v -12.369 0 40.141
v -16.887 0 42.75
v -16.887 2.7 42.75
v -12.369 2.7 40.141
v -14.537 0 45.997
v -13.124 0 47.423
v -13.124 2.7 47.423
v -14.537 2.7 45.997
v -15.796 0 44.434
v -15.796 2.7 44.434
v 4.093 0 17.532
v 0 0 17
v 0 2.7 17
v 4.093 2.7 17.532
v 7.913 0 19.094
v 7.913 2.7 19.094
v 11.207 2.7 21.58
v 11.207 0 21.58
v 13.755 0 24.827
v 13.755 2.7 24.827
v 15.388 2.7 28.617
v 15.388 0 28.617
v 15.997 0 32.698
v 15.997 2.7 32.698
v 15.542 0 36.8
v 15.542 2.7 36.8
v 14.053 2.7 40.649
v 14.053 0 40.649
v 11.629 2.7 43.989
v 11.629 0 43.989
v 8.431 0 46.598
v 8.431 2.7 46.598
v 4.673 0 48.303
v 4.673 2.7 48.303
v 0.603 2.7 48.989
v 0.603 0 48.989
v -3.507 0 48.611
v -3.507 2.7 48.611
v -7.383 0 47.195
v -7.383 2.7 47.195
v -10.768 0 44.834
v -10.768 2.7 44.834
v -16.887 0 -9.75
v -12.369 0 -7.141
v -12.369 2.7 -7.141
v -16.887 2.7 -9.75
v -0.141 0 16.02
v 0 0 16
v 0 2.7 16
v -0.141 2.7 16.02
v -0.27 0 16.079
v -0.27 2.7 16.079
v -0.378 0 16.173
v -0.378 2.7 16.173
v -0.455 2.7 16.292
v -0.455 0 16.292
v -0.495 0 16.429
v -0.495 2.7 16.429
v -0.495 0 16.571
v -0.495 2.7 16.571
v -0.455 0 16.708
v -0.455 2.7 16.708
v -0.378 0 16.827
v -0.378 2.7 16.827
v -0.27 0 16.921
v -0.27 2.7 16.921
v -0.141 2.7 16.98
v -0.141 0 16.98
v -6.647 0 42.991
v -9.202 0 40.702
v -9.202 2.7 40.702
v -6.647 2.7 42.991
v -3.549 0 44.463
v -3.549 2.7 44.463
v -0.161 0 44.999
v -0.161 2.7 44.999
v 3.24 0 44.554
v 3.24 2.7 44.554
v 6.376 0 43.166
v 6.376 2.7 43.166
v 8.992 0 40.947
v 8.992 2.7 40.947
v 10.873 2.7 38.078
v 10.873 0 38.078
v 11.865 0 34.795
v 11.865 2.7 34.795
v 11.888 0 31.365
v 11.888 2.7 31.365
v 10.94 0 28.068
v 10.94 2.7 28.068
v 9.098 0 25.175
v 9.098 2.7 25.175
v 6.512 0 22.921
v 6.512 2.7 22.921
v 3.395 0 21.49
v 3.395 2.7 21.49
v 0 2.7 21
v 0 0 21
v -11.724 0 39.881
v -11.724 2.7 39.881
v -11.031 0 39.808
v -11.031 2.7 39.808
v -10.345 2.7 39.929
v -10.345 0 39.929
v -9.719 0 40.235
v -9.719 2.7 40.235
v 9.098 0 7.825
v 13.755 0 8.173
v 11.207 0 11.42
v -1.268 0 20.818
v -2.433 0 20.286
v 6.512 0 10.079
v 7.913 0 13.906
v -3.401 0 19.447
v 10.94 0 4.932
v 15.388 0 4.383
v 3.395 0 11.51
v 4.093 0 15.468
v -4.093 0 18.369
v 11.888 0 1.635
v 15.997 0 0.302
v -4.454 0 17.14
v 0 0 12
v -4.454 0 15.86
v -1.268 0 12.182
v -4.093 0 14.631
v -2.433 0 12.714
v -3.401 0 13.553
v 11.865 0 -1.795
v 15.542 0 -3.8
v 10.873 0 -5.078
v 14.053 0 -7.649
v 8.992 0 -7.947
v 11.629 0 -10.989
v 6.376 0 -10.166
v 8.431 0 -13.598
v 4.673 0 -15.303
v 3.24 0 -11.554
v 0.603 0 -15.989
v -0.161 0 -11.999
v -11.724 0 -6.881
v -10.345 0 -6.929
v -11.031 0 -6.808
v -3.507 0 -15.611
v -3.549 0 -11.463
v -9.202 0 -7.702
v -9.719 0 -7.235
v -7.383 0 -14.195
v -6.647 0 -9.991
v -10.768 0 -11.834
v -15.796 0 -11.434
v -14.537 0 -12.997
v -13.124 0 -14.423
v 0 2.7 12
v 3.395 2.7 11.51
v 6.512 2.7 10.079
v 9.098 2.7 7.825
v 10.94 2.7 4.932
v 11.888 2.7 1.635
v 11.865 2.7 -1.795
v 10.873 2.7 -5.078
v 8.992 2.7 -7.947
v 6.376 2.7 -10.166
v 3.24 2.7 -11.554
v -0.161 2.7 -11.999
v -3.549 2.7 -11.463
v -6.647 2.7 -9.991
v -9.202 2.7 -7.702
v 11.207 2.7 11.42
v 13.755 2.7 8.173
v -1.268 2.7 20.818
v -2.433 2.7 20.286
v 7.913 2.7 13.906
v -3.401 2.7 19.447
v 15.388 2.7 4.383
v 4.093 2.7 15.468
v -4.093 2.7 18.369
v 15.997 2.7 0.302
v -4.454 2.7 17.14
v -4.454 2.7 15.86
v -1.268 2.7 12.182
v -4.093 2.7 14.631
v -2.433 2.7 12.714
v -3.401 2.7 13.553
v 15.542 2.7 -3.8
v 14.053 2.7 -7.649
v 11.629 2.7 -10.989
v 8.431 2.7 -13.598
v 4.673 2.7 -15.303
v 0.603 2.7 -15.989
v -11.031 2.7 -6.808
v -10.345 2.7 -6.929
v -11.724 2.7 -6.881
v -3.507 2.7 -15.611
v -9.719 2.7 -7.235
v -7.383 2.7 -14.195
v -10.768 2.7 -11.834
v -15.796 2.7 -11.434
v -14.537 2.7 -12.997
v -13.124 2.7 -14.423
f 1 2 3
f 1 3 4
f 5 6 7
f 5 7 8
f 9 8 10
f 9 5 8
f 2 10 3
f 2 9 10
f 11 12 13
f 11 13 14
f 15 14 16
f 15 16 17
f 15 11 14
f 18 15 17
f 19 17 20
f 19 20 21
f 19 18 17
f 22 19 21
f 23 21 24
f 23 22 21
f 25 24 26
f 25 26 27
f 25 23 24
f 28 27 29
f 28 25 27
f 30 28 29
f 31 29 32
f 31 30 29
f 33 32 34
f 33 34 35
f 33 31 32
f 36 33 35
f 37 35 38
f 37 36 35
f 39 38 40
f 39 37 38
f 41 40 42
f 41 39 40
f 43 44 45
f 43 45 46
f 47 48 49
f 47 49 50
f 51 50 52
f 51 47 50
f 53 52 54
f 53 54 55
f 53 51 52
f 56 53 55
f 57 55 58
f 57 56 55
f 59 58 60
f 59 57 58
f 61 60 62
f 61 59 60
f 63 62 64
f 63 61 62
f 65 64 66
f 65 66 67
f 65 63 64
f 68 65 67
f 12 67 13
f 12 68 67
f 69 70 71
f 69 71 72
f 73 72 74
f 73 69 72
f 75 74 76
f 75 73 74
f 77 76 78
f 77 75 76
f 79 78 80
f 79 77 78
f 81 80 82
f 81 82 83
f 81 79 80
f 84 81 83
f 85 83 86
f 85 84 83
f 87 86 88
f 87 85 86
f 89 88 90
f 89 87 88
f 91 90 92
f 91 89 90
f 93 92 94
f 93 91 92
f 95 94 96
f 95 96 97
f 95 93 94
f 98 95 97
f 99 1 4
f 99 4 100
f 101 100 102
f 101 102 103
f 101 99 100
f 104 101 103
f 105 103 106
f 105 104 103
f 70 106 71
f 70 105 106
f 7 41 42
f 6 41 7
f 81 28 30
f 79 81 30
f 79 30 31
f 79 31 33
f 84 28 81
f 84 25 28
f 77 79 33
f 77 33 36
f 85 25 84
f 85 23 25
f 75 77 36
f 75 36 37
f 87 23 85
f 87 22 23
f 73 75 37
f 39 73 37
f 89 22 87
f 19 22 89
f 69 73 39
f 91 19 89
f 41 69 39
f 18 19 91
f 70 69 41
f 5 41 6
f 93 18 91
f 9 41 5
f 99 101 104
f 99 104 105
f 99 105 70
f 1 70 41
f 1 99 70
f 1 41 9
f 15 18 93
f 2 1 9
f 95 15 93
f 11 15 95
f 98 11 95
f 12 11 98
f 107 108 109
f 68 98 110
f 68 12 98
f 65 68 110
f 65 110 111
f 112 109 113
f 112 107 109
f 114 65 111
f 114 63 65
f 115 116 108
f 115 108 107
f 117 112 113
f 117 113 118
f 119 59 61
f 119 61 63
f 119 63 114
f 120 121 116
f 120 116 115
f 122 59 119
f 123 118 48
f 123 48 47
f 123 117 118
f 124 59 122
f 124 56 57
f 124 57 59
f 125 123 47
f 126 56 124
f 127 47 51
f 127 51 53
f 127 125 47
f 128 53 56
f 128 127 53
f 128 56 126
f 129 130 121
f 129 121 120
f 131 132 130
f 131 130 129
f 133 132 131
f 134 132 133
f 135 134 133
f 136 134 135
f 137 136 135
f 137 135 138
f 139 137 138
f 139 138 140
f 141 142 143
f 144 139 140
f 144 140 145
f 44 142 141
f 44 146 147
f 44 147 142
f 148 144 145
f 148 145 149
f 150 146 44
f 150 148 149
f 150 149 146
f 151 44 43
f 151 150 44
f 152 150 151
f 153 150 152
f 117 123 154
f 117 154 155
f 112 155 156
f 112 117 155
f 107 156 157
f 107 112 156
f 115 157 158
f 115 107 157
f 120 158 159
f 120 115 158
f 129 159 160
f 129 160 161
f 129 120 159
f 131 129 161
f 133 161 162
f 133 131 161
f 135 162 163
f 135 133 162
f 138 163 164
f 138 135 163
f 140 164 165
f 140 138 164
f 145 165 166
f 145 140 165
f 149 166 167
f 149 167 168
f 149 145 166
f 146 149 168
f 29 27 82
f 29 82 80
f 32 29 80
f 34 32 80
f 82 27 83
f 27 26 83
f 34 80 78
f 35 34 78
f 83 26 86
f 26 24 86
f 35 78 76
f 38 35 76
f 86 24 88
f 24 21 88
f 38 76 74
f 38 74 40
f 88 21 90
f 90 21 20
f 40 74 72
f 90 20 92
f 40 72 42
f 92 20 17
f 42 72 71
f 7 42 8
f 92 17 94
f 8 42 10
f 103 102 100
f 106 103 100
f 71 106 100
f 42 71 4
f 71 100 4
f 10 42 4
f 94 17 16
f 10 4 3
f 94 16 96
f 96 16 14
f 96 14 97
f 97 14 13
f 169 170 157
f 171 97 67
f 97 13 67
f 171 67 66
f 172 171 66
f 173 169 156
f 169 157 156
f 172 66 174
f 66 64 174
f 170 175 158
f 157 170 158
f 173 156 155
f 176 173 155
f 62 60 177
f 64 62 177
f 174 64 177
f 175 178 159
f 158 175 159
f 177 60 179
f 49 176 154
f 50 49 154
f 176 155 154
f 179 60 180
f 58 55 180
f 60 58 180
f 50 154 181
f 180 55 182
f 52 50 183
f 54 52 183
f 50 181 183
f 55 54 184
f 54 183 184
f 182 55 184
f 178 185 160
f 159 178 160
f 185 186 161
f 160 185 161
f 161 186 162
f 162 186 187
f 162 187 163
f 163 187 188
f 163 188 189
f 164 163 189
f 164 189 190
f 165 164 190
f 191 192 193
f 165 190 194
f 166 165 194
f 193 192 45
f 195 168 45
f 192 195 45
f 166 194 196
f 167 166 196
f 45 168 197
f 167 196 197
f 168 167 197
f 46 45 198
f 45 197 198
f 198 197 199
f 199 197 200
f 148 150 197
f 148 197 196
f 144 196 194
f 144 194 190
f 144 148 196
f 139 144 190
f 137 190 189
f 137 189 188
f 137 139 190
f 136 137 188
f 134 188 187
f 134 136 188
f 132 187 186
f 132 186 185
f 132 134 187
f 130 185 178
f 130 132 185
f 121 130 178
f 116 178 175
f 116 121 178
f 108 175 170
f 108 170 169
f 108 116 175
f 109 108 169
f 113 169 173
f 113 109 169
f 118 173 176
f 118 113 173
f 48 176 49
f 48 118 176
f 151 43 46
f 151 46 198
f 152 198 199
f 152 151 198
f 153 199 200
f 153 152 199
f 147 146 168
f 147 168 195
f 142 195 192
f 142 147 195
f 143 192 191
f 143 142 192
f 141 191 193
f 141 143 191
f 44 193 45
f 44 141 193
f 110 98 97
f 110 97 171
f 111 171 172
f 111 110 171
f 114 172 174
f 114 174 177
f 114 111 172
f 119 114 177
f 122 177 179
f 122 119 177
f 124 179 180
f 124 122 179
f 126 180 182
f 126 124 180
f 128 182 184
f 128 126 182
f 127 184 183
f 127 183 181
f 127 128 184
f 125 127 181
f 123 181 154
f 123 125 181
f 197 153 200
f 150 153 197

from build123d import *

# Parameters (mm, degrees)
EXTRUDE_1_DEPTH = 2.7


with BuildPart() as part:
    # 草图1 → 凸台-拉伸1 (new body)
    with BuildSketch(Plane(origin=(0, 0, 0), x_dir=(1, 0, 0), z_dir=(0, 1, 0))):
        with BuildLine():
            Line((-12.369316877, 7.141428429), (-16.887495374, 9.75))
            ThreePointArc((-16.887495374, 9.75), (-15.186446596, 12.232000645), (-13.123802868, 14.422752799))
            Line((-13.123802868, 14.422752799), (-10.768248507, 11.834053578))
            ThreePointArc((-10.768248507, 11.834053578), (14.922212592, 5.77300367), (0, -16))
            ThreePointArc((0, -16), (-0.5, -16.5), (0, -17))
            ThreePointArc((0, -17), (14.922212592, -38.77300367), (-10.768248507, -44.834053578))
            Line((-10.768248507, -44.834053578), (-13.123802868, -47.422752799))
            ThreePointArc((-13.123802868, -47.422752799), (-15.186446596, -45.232000645), (-16.887495374, -42.75))
            Line((-16.887495374, -42.75), (-12.369316877, -40.141428429))
            ThreePointArc((-12.369316877, -40.141428429), (-10.683653707, -39.844745078), (-9.202193277, -40.701924362))
            ThreePointArc((-9.202193277, -40.701924362), (10.872513333, -38.078233337), (0, -21))
            ThreePointArc((0, -21), (-4.5, -16.5), (0, -12))
            ThreePointArc((0, -12), (10.872513333, 5.078233337), (-9.202193277, 7.701924362))
            ThreePointArc((-9.202193277, 7.701924362), (-10.683653707, 6.844745078), (-12.369316877, 7.141428429))
        make_face()
    extrude(amount=EXTRUDE_1_DEPTH)


solid = part.part
